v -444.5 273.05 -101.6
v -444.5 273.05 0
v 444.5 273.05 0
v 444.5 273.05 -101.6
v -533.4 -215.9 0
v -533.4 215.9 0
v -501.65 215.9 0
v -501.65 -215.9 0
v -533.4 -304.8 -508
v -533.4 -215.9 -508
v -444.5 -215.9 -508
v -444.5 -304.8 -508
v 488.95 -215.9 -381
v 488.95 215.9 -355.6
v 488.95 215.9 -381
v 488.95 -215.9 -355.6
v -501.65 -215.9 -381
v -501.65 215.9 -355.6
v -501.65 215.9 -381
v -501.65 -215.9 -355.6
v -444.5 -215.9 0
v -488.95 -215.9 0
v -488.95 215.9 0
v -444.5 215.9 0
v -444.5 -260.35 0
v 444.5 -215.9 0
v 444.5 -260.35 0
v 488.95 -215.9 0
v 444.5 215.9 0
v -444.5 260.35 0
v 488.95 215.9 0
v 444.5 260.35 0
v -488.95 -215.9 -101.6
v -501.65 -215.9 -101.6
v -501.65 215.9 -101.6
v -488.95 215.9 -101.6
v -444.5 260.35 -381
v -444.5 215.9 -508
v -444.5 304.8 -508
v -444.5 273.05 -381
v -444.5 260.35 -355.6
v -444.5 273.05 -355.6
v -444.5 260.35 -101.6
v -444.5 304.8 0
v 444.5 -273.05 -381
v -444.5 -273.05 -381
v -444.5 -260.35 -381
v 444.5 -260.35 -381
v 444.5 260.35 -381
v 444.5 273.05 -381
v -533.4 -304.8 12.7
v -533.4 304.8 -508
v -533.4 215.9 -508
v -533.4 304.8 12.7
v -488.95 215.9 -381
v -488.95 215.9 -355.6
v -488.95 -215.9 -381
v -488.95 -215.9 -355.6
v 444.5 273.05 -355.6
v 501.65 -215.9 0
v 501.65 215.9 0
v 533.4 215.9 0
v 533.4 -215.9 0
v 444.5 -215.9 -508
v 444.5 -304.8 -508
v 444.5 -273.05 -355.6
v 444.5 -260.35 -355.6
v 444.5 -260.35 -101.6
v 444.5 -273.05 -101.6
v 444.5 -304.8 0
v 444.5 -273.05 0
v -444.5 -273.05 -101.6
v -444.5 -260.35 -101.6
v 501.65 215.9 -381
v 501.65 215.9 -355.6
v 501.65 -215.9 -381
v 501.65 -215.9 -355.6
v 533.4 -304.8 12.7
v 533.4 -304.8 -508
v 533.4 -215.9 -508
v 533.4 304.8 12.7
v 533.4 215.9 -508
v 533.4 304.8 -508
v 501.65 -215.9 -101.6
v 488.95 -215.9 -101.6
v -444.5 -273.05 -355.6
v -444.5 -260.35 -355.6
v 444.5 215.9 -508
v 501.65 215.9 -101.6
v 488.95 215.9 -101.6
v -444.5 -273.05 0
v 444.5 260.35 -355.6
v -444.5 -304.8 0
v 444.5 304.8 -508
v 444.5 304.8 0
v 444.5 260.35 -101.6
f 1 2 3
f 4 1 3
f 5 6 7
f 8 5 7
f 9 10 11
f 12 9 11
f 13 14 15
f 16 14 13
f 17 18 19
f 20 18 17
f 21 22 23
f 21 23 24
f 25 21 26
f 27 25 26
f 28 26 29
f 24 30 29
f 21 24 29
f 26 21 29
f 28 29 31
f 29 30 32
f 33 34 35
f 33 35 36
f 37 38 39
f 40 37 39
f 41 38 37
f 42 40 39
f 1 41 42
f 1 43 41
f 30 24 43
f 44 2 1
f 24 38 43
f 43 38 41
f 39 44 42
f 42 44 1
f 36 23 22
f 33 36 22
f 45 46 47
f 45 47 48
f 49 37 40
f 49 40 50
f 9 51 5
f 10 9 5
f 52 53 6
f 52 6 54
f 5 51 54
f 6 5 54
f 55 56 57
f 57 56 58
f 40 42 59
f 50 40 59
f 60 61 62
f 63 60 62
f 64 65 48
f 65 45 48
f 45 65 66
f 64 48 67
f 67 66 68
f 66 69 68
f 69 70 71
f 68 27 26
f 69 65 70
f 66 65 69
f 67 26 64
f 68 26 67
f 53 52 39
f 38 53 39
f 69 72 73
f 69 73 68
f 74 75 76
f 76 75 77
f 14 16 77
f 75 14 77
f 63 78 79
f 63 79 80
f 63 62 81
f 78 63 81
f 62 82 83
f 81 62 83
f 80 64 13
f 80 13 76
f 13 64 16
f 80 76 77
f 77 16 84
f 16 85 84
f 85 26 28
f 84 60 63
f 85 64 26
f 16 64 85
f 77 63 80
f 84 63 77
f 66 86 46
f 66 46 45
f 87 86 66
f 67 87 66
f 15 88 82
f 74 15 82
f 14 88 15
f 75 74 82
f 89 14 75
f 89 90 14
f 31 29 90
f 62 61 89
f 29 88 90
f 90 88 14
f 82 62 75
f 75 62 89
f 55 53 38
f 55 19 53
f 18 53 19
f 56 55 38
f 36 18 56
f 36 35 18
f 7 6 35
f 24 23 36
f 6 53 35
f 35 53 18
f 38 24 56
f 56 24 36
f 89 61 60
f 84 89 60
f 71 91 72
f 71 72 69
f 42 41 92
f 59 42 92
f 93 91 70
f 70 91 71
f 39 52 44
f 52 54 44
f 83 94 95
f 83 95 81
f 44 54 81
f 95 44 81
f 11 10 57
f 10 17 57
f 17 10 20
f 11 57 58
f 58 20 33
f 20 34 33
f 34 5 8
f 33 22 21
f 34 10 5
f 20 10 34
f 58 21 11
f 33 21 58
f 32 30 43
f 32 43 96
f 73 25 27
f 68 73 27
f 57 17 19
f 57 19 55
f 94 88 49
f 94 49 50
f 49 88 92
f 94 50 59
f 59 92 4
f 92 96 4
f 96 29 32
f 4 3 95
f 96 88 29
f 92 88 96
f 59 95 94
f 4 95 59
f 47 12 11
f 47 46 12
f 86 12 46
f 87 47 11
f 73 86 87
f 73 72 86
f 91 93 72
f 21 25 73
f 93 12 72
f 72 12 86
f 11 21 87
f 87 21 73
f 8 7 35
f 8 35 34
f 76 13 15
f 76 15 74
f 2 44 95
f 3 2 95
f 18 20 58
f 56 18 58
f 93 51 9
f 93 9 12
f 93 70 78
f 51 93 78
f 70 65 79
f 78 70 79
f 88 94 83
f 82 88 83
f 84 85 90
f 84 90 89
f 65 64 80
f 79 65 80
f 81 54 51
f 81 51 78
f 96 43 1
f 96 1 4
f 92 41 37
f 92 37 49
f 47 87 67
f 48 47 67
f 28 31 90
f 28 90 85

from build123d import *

# Parameters (mm, degrees)
F1_DEPTH      = 12.7
F0_W          = 88.9
F0_H          = 88.9
F2_DEPTH      = 12.7
F2_DEPTH_BACK = 508
F3_W          = 889
F3_H          = 12.7
F3_W_2        = 12.7
F3_H_2        = 431.8
F4_DEPTH      = 101.6
F6_W          = 889
F6_H          = 12.7
F6_W_2        = 12.7
F6_H_2        = 431.8
F7_DEPTH      = 25.4


with BuildPart() as f1:
    # F0 (on Top) → F1 (new body)
    with BuildSketch(Plane.XY):
        Polygon((444.5, 304.8), (-444.5, 304.8), (-444.5, 215.9), (-533.4, 215.9), (-533.4, -215.9), (-444.5, -215.9), (-444.5, -304.8), (444.5, -304.8), (444.5, -215.9), (533.4, -215.9), (533.4, 215.9), (444.5, 215.9), align=None)
    extrude(amount=F1_DEPTH)

    # F0 (on Top) → F2 (join, two sides)
    with BuildSketch(Plane.XY) as f2_sk:
        with Locations((-488.95, 260.35)):
            Rectangle(F0_W, F0_H)
        with Locations((-488.95, -260.35)):
            Rectangle(F0_W, F0_H)
        with Locations((488.95, 260.35)):
            Rectangle(F0_W, F0_H)
        with Locations((488.95, -260.35)):
            Rectangle(F0_W, F0_H)
    extrude(amount=F2_DEPTH)
    extrude(f2_sk.sketch, amount=-F2_DEPTH_BACK)

    # F3 (on face) → F4 (join)
    with BuildSketch(Plane(origin=(0, 0, 0), x_dir=(1, 0, 0), z_dir=(0, 0, -1))):
        with Locations((0, 266.7)):
            Rectangle(F3_W, F3_H)
        with Locations((-495.3, 0)):
            Rectangle(F3_W_2, F3_H_2)
        with Locations((0, -266.7)):
            Rectangle(F3_W, F3_H)
        with Locations((495.3, 0)):
            Rectangle(F3_W_2, F3_H_2)
    extrude(amount=F4_DEPTH)

    # F6 (on offset) → F7 (join)
    with BuildSketch(Plane(origin=(0, 0, -355.6), x_dir=(1, 0, 0), z_dir=(0, 0, -1))):
        with Locations((0, 266.7)):
            Rectangle(F6_W, F6_H)
        with Locations((0, -266.7)):
            Rectangle(F6_W, F6_H)
        with Locations((-495.3, 0)):
            Rectangle(F6_W_2, F6_H_2)
        with Locations((495.3, 0)):
            Rectangle(F6_W_2, F6_H_2)
    extrude(amount=F7_DEPTH)


solid = f1.part
